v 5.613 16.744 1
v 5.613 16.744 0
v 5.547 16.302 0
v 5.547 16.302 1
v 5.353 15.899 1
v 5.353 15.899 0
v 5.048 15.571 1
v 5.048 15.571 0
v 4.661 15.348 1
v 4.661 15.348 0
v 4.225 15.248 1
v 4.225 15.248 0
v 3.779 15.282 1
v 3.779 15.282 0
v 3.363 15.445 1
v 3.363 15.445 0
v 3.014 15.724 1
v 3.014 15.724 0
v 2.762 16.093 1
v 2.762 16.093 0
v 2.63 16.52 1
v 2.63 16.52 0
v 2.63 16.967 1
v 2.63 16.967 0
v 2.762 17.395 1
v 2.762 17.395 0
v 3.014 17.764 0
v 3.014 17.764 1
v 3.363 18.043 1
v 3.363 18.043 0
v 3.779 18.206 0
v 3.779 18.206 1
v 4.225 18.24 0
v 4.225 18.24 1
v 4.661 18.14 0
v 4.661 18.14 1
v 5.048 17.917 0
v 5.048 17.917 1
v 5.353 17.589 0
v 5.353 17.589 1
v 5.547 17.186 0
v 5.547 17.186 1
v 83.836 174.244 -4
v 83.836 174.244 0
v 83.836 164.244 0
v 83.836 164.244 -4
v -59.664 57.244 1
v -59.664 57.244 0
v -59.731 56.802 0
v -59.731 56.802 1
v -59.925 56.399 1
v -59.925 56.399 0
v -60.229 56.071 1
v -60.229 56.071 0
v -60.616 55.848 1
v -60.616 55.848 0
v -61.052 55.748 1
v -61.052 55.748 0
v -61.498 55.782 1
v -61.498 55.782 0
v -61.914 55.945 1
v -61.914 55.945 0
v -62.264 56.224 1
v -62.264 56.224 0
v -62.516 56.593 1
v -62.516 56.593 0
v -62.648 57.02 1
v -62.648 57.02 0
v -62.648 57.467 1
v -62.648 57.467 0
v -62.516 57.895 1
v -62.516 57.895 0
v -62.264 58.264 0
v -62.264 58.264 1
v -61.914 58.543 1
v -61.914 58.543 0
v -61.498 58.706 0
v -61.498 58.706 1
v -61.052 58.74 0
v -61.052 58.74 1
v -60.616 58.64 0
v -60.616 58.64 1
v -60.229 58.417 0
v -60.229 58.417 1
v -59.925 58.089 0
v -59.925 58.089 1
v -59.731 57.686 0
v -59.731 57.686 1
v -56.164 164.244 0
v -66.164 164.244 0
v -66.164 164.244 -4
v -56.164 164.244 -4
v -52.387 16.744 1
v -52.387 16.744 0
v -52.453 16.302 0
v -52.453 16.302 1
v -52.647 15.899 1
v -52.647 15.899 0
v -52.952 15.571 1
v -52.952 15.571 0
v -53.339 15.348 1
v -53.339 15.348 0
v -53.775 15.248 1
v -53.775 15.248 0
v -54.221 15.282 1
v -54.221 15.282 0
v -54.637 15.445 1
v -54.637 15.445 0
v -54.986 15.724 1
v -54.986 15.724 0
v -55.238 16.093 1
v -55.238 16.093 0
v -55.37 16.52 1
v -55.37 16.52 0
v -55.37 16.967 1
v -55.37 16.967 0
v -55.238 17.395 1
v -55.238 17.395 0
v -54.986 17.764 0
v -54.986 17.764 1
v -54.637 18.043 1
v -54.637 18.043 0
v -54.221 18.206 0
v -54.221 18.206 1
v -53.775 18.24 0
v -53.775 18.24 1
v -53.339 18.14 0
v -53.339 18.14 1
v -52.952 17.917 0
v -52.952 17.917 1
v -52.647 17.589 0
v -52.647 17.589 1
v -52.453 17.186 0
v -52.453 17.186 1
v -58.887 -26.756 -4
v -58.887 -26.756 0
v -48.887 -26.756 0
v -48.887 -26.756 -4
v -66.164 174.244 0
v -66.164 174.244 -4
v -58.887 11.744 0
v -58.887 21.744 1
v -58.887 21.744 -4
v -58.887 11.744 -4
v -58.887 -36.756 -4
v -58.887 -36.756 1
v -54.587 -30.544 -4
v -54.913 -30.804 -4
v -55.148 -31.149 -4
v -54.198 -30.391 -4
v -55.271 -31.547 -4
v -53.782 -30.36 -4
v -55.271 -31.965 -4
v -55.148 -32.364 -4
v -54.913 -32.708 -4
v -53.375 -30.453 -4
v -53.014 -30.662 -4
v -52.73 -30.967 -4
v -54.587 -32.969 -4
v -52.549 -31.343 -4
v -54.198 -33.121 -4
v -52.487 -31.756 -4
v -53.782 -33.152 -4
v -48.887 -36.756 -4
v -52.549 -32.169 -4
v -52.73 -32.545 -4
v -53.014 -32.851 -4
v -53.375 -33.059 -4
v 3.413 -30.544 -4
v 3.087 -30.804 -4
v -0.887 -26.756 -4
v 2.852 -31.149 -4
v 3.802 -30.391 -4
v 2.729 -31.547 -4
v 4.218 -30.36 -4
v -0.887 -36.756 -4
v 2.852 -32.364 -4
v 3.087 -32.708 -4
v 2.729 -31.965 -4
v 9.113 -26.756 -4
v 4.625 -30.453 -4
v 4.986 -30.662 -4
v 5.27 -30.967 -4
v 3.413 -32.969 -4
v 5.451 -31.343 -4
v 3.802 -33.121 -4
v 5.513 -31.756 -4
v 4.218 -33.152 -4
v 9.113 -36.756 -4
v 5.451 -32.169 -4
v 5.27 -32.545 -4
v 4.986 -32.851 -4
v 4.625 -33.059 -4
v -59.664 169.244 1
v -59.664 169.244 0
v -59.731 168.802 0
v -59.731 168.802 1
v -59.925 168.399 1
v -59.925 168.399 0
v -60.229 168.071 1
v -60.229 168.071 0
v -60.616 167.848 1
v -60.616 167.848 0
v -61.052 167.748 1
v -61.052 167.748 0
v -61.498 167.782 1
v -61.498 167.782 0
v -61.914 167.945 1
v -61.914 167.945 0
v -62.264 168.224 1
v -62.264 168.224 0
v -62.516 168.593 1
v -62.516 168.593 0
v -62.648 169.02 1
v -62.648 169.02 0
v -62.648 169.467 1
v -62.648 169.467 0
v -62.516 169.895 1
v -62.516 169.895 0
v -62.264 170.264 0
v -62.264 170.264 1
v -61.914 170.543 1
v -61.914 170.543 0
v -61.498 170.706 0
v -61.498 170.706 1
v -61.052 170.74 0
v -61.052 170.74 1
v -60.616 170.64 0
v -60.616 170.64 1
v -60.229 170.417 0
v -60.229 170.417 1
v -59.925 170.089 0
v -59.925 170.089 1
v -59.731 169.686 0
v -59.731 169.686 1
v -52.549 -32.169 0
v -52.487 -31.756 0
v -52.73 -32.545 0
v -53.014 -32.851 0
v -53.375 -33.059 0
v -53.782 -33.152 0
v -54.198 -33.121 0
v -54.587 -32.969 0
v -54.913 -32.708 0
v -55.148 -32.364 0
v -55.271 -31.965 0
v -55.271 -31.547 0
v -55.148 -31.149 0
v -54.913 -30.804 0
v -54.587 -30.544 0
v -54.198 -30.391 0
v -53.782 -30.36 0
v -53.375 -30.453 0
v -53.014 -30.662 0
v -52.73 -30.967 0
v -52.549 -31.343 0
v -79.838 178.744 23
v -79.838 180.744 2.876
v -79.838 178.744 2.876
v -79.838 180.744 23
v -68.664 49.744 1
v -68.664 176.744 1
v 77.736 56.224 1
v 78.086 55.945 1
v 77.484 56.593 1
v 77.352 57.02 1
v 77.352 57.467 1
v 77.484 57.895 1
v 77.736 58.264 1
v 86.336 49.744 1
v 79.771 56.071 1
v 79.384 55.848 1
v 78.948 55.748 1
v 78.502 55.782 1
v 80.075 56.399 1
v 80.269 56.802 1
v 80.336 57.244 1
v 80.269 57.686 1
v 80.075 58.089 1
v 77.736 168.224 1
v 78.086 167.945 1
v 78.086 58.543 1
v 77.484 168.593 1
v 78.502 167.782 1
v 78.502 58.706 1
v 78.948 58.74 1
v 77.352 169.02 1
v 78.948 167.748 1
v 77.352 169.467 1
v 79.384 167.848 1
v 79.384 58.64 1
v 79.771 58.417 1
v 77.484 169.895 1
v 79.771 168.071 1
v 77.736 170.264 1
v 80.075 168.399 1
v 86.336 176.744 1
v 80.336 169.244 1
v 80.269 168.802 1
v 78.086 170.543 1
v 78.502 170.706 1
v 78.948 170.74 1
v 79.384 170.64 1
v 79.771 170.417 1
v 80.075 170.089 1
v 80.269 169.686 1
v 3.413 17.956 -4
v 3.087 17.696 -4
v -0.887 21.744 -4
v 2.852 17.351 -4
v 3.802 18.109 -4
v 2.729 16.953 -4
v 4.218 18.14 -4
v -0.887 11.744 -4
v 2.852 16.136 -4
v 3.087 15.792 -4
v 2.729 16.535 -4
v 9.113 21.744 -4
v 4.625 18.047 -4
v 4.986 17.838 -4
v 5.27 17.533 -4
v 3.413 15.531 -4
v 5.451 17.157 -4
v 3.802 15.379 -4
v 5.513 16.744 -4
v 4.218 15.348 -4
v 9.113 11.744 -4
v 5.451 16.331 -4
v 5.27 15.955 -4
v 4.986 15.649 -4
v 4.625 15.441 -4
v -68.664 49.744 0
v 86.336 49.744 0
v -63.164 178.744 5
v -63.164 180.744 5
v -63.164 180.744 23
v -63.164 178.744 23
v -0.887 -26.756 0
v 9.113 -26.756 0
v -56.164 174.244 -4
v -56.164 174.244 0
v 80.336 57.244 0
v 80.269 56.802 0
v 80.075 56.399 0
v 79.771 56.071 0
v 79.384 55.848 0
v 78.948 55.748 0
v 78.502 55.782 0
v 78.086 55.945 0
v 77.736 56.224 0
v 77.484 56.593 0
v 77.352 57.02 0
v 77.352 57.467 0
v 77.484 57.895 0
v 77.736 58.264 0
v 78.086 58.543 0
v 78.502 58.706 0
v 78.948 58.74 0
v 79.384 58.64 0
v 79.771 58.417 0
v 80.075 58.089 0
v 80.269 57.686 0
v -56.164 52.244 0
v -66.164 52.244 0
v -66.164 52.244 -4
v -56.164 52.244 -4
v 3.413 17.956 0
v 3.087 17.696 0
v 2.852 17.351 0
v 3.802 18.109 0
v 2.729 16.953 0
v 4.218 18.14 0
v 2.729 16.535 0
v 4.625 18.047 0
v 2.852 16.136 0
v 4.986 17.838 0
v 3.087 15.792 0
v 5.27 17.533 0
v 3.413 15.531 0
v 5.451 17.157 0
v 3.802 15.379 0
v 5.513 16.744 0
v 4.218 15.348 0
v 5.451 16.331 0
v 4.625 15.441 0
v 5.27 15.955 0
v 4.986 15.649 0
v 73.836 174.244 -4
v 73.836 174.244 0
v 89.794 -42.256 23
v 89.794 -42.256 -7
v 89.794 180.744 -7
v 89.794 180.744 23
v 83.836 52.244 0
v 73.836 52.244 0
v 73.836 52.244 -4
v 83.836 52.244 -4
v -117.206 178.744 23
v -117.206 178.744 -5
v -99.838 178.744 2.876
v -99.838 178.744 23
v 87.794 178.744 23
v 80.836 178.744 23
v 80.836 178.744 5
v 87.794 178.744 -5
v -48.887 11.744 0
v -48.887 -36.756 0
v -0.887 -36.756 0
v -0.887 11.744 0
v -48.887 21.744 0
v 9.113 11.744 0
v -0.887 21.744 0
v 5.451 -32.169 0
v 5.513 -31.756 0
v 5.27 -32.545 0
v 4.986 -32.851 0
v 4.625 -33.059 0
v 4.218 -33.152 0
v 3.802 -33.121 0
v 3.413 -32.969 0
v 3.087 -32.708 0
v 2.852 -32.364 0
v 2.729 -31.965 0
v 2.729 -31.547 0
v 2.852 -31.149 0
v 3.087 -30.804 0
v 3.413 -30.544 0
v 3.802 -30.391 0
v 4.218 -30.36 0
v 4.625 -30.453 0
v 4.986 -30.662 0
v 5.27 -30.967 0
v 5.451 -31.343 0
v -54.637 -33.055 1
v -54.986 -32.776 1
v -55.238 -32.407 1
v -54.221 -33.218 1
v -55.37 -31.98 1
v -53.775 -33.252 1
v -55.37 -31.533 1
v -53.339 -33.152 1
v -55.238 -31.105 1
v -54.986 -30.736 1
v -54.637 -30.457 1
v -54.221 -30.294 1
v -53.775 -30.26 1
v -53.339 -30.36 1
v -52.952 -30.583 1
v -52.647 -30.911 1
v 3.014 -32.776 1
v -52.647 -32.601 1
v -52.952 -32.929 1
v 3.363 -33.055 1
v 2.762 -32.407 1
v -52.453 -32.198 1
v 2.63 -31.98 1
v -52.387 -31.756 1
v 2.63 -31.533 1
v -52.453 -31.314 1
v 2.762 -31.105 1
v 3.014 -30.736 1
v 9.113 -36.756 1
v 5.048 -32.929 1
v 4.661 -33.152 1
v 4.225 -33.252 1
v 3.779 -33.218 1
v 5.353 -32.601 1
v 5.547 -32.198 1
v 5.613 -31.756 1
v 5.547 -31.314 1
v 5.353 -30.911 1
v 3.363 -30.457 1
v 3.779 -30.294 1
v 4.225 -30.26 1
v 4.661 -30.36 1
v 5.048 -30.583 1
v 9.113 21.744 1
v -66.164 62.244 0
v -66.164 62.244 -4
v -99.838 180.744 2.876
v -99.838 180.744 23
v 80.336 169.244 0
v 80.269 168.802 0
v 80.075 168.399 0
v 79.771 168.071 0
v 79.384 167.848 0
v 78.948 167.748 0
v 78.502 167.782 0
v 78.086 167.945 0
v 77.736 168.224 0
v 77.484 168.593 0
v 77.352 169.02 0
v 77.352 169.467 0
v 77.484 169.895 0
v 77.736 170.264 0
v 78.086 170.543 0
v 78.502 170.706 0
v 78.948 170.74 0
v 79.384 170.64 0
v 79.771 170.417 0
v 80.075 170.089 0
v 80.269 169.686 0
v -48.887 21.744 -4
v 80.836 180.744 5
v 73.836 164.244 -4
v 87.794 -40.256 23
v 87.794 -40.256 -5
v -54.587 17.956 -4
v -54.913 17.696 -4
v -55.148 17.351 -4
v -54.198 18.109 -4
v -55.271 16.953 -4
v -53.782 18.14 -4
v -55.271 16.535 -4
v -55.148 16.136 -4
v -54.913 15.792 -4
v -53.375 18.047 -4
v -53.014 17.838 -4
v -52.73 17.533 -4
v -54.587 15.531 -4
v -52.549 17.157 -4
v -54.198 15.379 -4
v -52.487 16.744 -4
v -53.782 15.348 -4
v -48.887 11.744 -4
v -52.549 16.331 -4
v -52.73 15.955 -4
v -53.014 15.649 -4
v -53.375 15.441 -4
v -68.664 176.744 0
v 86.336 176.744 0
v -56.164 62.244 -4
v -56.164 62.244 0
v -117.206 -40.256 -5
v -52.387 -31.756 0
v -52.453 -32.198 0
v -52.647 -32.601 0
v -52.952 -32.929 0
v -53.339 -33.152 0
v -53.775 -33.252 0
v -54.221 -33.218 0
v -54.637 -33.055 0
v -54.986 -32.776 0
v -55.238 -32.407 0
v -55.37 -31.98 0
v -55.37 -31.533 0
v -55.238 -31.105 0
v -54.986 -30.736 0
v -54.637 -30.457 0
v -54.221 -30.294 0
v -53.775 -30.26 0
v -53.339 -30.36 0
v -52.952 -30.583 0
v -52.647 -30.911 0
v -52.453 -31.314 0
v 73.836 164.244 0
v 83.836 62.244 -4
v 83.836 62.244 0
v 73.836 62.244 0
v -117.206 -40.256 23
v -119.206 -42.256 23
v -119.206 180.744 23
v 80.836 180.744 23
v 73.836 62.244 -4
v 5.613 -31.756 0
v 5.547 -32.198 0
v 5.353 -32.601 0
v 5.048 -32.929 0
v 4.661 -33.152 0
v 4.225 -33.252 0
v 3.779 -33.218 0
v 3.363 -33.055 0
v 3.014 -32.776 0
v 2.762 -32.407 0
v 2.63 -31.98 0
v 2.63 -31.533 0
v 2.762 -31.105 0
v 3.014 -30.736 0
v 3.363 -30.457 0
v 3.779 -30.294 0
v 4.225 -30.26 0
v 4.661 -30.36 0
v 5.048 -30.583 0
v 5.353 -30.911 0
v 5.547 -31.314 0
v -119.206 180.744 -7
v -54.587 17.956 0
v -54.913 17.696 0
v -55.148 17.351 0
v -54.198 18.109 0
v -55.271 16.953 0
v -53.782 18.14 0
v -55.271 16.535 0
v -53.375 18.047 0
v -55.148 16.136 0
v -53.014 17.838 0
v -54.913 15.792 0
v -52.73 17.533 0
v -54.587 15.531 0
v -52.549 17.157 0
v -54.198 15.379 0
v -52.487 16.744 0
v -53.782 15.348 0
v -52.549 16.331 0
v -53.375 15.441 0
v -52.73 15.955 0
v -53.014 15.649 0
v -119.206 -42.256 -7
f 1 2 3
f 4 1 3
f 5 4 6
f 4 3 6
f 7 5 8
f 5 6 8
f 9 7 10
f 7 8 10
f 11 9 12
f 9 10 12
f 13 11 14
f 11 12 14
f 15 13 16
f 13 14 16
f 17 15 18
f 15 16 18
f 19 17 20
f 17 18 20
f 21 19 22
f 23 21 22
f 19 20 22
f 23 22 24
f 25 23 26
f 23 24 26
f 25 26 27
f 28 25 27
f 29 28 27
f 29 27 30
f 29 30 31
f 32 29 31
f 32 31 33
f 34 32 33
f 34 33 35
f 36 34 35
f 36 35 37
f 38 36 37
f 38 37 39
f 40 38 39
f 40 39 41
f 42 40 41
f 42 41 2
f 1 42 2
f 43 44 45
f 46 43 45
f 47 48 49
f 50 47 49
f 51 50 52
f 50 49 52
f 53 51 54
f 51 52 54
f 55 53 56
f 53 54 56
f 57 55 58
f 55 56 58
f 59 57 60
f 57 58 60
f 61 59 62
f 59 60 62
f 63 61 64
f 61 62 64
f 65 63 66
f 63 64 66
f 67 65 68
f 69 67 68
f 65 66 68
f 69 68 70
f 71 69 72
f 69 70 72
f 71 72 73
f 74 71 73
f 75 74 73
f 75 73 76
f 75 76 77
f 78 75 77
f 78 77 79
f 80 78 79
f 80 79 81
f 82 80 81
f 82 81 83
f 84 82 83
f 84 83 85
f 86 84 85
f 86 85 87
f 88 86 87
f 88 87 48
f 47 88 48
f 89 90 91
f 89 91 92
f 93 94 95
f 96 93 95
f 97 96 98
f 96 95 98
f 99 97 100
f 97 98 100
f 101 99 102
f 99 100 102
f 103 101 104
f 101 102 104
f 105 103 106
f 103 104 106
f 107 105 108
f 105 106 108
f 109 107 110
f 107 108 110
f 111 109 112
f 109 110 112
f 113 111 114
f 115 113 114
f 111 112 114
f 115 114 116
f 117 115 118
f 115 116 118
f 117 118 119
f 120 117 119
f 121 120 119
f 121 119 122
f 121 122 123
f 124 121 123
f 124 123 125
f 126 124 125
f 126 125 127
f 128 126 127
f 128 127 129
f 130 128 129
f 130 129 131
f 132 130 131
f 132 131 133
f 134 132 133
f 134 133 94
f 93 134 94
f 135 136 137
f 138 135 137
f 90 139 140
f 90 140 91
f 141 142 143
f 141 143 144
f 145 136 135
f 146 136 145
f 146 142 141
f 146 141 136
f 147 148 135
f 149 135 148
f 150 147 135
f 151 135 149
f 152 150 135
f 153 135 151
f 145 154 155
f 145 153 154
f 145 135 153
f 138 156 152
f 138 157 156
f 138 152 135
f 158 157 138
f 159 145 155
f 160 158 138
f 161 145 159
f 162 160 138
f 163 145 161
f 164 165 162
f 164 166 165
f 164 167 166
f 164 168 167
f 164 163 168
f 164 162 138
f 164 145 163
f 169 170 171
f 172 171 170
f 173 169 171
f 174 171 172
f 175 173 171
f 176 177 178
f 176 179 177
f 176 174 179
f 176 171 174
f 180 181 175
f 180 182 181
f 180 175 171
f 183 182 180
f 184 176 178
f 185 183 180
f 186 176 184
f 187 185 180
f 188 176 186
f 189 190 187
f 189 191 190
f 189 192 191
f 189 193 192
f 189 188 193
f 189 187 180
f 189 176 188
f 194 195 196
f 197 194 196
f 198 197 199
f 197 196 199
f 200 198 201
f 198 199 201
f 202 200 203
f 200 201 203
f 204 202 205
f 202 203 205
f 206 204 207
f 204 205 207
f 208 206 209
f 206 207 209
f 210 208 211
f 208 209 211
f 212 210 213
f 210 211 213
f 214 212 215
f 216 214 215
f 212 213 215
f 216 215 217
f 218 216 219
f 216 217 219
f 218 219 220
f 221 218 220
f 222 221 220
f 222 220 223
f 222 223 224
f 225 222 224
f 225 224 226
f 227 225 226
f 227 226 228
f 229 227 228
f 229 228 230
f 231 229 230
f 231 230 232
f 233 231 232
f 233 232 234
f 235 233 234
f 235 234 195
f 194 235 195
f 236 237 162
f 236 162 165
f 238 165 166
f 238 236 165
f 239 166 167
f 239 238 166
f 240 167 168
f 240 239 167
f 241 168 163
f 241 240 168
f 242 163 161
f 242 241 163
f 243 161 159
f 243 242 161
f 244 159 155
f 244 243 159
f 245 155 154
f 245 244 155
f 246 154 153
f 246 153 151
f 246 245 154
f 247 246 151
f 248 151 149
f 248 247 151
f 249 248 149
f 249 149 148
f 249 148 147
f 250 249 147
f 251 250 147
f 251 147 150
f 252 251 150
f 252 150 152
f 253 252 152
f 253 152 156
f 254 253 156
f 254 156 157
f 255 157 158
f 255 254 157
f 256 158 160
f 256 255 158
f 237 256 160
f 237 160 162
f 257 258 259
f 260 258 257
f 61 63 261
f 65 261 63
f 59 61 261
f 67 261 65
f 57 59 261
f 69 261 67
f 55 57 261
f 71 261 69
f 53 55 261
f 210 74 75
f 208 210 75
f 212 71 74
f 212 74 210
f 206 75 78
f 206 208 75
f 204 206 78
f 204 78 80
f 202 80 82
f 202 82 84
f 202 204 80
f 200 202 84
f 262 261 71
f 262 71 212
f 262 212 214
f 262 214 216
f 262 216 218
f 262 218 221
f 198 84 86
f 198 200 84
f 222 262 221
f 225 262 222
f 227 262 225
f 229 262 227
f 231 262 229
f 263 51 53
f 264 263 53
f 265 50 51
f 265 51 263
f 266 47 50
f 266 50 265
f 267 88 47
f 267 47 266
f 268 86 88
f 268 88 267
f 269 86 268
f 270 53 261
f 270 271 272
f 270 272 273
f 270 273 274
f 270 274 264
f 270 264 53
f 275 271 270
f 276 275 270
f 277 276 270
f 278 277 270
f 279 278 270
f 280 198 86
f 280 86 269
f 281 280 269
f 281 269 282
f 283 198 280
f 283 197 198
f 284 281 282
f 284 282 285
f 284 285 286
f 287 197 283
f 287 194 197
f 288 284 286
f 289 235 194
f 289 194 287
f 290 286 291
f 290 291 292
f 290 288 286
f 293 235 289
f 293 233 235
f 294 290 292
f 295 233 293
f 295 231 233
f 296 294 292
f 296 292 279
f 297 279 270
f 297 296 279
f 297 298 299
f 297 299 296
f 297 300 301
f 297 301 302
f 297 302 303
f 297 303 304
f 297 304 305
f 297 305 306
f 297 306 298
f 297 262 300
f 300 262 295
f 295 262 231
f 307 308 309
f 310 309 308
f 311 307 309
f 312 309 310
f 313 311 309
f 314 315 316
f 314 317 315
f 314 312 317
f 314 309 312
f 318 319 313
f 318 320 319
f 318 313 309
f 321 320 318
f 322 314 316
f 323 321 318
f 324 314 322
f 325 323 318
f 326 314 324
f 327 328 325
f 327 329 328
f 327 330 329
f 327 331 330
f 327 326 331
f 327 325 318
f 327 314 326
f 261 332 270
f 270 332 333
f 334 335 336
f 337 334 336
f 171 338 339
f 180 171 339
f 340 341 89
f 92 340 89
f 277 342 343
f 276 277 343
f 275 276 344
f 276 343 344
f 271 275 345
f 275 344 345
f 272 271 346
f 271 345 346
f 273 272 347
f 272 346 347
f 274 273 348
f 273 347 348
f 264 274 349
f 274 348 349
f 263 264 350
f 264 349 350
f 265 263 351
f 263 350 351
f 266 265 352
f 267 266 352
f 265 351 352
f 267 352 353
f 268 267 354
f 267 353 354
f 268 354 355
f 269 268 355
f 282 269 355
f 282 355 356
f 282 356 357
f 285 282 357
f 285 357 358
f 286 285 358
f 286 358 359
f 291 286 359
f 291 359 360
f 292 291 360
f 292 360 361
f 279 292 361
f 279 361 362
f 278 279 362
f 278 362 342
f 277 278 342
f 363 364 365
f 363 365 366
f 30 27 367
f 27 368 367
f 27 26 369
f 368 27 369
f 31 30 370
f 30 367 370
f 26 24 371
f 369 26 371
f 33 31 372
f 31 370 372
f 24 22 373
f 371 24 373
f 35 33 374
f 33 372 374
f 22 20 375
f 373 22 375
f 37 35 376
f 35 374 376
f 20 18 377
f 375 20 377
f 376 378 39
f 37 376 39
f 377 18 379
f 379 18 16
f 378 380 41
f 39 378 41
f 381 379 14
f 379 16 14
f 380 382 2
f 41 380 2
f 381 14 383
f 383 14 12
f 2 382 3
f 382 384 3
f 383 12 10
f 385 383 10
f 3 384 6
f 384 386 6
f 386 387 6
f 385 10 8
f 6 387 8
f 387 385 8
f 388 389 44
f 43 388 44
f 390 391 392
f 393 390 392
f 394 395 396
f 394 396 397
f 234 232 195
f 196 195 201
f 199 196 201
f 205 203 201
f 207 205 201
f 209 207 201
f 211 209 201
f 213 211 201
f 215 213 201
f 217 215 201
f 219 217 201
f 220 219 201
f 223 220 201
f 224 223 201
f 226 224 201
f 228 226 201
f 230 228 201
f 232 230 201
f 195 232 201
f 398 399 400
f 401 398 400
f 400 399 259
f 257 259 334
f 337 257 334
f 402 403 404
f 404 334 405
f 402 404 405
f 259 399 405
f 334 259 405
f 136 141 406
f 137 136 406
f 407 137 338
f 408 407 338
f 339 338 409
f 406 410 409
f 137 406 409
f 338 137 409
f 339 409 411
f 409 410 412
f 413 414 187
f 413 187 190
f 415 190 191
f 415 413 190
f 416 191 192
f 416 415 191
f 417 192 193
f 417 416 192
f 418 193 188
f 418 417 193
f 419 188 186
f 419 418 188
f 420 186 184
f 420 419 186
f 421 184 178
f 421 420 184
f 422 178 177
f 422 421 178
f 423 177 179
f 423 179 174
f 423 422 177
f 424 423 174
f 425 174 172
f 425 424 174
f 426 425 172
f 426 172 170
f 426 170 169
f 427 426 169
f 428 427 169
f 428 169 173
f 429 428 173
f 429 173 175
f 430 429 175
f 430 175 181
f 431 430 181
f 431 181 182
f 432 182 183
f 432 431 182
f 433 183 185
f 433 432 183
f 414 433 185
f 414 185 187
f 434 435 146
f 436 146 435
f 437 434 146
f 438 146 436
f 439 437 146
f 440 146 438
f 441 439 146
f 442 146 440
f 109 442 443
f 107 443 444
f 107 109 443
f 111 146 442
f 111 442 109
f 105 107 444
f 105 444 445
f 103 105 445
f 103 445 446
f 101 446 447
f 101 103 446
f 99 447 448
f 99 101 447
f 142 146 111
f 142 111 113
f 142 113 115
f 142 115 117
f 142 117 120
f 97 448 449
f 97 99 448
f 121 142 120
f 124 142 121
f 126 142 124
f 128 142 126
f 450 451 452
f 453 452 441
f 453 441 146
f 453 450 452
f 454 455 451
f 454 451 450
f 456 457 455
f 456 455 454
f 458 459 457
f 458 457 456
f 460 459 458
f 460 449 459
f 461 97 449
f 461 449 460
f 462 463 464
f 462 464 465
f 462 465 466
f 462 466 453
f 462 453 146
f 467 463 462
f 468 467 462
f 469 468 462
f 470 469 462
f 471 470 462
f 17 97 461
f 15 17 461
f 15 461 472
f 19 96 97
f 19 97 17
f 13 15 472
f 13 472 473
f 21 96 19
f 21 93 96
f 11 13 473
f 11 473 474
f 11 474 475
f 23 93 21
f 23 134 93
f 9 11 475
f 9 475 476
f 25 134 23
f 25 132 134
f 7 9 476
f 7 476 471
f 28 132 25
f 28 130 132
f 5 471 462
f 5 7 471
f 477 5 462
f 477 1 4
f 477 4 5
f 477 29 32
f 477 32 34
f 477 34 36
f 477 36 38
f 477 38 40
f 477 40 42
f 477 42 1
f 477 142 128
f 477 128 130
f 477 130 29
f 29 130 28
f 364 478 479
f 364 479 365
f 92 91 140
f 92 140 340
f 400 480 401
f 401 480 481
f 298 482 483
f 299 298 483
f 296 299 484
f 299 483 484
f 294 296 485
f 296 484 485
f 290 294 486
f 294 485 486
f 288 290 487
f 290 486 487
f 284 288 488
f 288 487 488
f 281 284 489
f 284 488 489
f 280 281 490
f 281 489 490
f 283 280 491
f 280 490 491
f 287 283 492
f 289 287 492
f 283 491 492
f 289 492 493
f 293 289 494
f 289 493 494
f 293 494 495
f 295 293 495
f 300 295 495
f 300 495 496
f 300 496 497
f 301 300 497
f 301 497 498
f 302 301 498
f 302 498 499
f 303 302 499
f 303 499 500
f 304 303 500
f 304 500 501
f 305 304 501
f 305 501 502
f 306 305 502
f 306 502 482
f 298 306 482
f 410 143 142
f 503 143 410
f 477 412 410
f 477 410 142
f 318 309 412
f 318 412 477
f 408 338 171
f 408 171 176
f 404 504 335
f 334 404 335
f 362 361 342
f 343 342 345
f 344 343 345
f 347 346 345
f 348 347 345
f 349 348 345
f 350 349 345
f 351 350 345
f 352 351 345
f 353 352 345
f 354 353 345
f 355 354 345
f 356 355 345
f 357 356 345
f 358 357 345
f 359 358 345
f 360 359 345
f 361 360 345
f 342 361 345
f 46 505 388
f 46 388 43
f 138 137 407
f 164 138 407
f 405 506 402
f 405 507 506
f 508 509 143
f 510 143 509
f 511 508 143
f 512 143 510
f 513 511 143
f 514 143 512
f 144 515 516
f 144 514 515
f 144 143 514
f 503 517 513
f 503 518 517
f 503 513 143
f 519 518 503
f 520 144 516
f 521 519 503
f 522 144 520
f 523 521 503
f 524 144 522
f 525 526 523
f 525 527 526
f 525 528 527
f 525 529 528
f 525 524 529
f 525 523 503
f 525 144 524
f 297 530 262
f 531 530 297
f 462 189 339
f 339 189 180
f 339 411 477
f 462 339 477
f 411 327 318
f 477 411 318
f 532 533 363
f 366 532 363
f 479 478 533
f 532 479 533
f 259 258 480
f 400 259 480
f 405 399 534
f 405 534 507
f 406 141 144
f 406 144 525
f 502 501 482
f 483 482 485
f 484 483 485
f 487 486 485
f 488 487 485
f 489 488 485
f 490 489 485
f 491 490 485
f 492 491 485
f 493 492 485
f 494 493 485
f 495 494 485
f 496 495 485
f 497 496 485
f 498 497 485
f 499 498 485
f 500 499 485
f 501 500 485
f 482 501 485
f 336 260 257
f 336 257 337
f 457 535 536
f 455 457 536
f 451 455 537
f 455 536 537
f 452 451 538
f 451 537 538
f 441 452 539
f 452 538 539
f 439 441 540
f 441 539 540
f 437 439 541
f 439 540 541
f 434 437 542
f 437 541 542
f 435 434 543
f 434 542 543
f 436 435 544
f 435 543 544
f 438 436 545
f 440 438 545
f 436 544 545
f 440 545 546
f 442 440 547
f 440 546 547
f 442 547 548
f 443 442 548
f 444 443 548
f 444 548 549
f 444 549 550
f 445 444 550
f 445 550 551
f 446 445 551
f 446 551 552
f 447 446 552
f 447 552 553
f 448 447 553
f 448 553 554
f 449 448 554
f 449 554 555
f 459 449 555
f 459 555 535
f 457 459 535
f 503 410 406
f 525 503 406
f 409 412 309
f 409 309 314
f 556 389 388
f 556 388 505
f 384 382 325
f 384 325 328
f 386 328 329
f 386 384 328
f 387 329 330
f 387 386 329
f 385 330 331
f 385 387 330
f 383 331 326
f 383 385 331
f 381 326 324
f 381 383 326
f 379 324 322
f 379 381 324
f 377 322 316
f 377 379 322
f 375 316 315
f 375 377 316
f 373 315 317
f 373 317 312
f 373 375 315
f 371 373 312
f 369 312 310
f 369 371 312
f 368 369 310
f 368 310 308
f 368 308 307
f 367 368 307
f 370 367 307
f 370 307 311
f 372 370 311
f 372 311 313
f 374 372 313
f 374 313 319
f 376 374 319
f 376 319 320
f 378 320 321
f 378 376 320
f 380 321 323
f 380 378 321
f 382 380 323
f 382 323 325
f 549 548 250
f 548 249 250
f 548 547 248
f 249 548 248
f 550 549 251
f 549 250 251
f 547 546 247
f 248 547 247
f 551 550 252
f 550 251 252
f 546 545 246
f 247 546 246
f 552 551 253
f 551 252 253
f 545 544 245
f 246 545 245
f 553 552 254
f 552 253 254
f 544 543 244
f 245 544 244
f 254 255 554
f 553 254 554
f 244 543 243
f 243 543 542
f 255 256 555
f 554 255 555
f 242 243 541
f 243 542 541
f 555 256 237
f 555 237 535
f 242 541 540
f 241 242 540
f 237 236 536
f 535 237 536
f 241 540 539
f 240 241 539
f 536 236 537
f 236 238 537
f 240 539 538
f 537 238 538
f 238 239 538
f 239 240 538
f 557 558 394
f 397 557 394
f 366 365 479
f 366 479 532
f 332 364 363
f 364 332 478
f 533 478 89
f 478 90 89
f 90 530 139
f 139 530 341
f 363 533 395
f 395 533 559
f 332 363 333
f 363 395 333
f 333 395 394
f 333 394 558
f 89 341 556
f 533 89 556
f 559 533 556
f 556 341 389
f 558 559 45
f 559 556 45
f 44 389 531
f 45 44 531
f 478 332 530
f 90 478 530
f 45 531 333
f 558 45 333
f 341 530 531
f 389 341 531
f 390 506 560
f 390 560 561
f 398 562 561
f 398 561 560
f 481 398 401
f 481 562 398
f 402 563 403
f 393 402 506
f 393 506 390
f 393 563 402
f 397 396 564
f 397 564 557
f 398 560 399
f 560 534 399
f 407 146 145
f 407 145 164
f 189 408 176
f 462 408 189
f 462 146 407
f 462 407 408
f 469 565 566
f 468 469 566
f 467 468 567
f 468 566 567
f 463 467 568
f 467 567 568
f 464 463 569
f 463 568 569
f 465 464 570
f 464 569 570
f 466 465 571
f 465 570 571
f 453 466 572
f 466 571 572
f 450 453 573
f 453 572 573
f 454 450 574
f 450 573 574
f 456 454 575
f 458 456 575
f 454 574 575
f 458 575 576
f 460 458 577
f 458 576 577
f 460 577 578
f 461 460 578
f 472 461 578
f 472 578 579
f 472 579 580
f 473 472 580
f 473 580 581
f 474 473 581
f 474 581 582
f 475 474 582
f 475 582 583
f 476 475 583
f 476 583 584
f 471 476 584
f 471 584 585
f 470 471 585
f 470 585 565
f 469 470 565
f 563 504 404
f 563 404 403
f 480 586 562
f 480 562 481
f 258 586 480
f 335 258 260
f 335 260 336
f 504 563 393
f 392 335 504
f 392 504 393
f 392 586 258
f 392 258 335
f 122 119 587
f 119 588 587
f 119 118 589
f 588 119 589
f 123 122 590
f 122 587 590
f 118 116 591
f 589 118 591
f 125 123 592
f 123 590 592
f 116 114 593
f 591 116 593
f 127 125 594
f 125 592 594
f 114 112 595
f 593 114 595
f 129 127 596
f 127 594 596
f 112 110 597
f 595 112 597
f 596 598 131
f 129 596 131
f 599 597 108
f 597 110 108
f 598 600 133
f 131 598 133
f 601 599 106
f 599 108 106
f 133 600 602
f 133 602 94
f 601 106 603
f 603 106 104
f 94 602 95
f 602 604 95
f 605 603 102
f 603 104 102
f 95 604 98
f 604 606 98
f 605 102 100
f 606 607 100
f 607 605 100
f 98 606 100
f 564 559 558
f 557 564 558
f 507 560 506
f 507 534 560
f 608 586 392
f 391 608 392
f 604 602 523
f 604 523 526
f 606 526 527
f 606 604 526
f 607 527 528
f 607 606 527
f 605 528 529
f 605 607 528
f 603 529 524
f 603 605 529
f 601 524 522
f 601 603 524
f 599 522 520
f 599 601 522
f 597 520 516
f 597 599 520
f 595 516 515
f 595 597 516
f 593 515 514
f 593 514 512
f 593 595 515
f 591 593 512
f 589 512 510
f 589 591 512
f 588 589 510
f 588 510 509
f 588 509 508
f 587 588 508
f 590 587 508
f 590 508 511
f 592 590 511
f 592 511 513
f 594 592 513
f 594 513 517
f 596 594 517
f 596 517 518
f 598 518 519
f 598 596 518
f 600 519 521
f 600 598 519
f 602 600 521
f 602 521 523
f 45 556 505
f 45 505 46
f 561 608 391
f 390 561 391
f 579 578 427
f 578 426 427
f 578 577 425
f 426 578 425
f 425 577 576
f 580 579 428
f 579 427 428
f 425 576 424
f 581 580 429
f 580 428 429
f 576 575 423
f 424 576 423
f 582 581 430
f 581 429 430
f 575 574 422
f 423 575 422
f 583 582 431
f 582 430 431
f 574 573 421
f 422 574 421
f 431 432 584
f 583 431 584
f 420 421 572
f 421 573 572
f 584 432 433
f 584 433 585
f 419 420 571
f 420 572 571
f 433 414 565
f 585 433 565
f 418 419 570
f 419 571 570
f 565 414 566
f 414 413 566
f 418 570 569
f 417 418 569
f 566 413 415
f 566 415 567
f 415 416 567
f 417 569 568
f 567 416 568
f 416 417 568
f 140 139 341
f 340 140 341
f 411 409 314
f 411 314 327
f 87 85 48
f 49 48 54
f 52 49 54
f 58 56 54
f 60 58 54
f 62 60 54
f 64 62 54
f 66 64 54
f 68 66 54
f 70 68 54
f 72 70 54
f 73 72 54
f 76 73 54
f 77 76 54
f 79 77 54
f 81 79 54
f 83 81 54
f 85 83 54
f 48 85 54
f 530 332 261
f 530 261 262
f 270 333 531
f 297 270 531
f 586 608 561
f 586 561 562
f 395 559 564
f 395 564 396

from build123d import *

# Parameters (mm, degrees)
F0_W       = 68
F0_H       = 58.5
F1_DEPTH   = 1
F0_W_2     = 155
F0_H_2     = 127
F2_W       = 10
F2_H       = 10
F2_R       = 1.4
F3_DEPTH   = 4
F4_D       = 3
F4_DEPTH   = 3
F4_TIP     = 0.9012909285
F4_2_D     = 3
F4_2_DEPTH = 3
F4_2_TIP   = 0.9012909285
F6_W       = 209
F6_H       = 223
F7_DEPTH   = 30
F8_T       = -2
F9_W       = 144
F9_H       = 18
F9_W_2     = 20
F9_H_2     = 20.1240624189
F10_DEPTH  = 2


with BuildPart() as f1:
    # F0 (on Top) → F1 (new body)
    with BuildSketch(Plane.XY):
        with Locations((-24.8868372291, -7.5060833693)):
            Rectangle(F0_W, F0_H)
    extrude(amount=F1_DEPTH)

    # F2 (on face) → F3 (join)
    with BuildSketch(Plane(origin=(0, 0, 0), x_dir=(1, 0, 0), z_dir=(0, 0, -1))):
        with Locations((-53.8868372291, 31.7560833693)):
            Rectangle(F2_W, F2_H)
        with Locations((-53.8868372291, 31.7560833693)):
            Circle(F2_R, mode=Mode.SUBTRACT)
        with Locations((4.1131627709, 31.7560833693)):
            Rectangle(F2_W, F2_H)
        with Locations((4.1131627709, 31.7560833693)):
            Circle(F2_R, mode=Mode.SUBTRACT)
        with Locations((-53.8868372291, -16.7439166307)):
            Rectangle(F2_W, F2_H)
        with Locations((-53.8868372291, -16.7439166307)):
            Circle(F2_R, mode=Mode.SUBTRACT)
        with Locations((4.1131627709, -16.7439166307)):
            Rectangle(F2_W, F2_H)
        with Locations((4.1131627709, -16.7439166307)):
            Circle(F2_R, mode=Mode.SUBTRACT)
    extrude(amount=F3_DEPTH)

    # F4 (one way)
    with BuildSketch(Plane(origin=(0, 0, 0), x_dir=(1, 0, 0), z_dir=(0, 0, -1))):
        with Locations((-53.8868372291, 31.7560833693), (-53.8868372291, -16.7439166307), (4.1131627709, -16.7439166307), (4.1131627709, 31.7560833693), (-61.1643928289, -169.2439166307), (-61.1643928289, -57.2439166307), (78.8356071711, -57.2439166307), (78.8356071711, -169.2439166307)):
            Circle(F4_D / 2)
    extrude(amount=-F4_DEPTH, mode=Mode.SUBTRACT)
    with Locations(Plane(origin=(0, 0, 0), x_dir=(1, 0, 0), z_dir=(0, 0, -1))):
        with Locations((-53.8868372291, 31.7560833693), (-53.8868372291, -16.7439166307), (4.1131627709, -16.7439166307), (4.1131627709, 31.7560833693), (-61.1643928289, -169.2439166307), (-61.1643928289, -57.2439166307), (78.8356071711, -57.2439166307), (78.8356071711, -169.2439166307)):
            with Locations((0, 0, -(F4_DEPTH + F4_TIP / 2))):  # 118° drill point
                Cone(0, F4_D / 2, F4_TIP, mode=Mode.SUBTRACT)


with BuildPart() as f1b:
    # F0 (on Top) → F1, piece 2 (new body)
    with BuildSketch(Plane.XY):
        with Locations((8.8356071711, 113.2439166307)):
            Rectangle(F0_W_2, F0_H_2)
    extrude(amount=F1_DEPTH)

    # F2 (on face) → F3, piece 2 (join)
    with BuildSketch(Plane(origin=(0, 0, 0), x_dir=(1, 0, 0), z_dir=(0, 0, -1))):
        with Locations((-61.1643928289, -169.2439166307)):
            Rectangle(F2_W, F2_H)
        with Locations((78.8356071711, -169.2439166307)):
            Rectangle(F2_W, F2_H)
        with Locations((-61.1643928289, -57.2439166307)):
            Rectangle(F2_W, F2_H)
        with Locations((78.8356071711, -57.2439166307)):
            Rectangle(F2_W, F2_H)
    extrude(amount=F3_DEPTH)

    # F4#2 (one way)
    with BuildSketch(Plane(origin=(0, 0, 0), x_dir=(1, 0, 0), z_dir=(0, 0, -1))):
        with Locations((-53.8868372291, 31.7560833693), (-53.8868372291, -16.7439166307), (4.1131627709, -16.7439166307), (4.1131627709, 31.7560833693), (-61.1643928289, -169.2439166307), (-61.1643928289, -57.2439166307), (78.8356071711, -57.2439166307), (78.8356071711, -169.2439166307)):
            Circle(F4_2_D / 2)
    extrude(amount=-F4_2_DEPTH, mode=Mode.SUBTRACT)
    with Locations(Plane(origin=(0, 0, 0), x_dir=(1, 0, 0), z_dir=(0, 0, -1))):
        with Locations((-53.8868372291, 31.7560833693), (-53.8868372291, -16.7439166307), (4.1131627709, -16.7439166307), (4.1131627709, 31.7560833693), (-61.1643928289, -169.2439166307), (-61.1643928289, -57.2439166307), (78.8356071711, -57.2439166307), (78.8356071711, -169.2439166307)):
            with Locations((0, 0, -(F4_2_DEPTH + F4_2_TIP / 2))):  # 118° drill point
                Cone(0, F4_2_D / 2, F4_2_TIP, mode=Mode.SUBTRACT)


with BuildPart() as f7:
    # F6 (on offset) → F7 (new body)
    with BuildSketch(Plane.XY.offset(-7)):
        with Locations((-14.7055135965, 69.2439166307)):
            Rectangle(F6_W, F6_H)
    extrude(amount=F7_DEPTH)

    # F8
    f8_openings = [f7.faces().sort_by_distance(p)[0] for p in [
        (-14.705514, 69.243917, 23),
    ]]
    offset(amount=F8_T, openings=f8_openings)

    # F9 (on face) → F10 (cut)
    with BuildSketch(Plane(origin=(0, 180.7439166307, 0), x_dir=(-1, 0, 0), z_dir=(0, 1, 0))):
        with Locations((-8.8356071711, 14)):
            Rectangle(F9_W, F9_H)
        with Locations((89.8379927874, 12.9379687905)):
            Rectangle(F9_W_2, F9_H_2)
    extrude(amount=-F10_DEPTH, mode=Mode.SUBTRACT)


solid = Compound([f1.part, f1b.part, f7.part])
